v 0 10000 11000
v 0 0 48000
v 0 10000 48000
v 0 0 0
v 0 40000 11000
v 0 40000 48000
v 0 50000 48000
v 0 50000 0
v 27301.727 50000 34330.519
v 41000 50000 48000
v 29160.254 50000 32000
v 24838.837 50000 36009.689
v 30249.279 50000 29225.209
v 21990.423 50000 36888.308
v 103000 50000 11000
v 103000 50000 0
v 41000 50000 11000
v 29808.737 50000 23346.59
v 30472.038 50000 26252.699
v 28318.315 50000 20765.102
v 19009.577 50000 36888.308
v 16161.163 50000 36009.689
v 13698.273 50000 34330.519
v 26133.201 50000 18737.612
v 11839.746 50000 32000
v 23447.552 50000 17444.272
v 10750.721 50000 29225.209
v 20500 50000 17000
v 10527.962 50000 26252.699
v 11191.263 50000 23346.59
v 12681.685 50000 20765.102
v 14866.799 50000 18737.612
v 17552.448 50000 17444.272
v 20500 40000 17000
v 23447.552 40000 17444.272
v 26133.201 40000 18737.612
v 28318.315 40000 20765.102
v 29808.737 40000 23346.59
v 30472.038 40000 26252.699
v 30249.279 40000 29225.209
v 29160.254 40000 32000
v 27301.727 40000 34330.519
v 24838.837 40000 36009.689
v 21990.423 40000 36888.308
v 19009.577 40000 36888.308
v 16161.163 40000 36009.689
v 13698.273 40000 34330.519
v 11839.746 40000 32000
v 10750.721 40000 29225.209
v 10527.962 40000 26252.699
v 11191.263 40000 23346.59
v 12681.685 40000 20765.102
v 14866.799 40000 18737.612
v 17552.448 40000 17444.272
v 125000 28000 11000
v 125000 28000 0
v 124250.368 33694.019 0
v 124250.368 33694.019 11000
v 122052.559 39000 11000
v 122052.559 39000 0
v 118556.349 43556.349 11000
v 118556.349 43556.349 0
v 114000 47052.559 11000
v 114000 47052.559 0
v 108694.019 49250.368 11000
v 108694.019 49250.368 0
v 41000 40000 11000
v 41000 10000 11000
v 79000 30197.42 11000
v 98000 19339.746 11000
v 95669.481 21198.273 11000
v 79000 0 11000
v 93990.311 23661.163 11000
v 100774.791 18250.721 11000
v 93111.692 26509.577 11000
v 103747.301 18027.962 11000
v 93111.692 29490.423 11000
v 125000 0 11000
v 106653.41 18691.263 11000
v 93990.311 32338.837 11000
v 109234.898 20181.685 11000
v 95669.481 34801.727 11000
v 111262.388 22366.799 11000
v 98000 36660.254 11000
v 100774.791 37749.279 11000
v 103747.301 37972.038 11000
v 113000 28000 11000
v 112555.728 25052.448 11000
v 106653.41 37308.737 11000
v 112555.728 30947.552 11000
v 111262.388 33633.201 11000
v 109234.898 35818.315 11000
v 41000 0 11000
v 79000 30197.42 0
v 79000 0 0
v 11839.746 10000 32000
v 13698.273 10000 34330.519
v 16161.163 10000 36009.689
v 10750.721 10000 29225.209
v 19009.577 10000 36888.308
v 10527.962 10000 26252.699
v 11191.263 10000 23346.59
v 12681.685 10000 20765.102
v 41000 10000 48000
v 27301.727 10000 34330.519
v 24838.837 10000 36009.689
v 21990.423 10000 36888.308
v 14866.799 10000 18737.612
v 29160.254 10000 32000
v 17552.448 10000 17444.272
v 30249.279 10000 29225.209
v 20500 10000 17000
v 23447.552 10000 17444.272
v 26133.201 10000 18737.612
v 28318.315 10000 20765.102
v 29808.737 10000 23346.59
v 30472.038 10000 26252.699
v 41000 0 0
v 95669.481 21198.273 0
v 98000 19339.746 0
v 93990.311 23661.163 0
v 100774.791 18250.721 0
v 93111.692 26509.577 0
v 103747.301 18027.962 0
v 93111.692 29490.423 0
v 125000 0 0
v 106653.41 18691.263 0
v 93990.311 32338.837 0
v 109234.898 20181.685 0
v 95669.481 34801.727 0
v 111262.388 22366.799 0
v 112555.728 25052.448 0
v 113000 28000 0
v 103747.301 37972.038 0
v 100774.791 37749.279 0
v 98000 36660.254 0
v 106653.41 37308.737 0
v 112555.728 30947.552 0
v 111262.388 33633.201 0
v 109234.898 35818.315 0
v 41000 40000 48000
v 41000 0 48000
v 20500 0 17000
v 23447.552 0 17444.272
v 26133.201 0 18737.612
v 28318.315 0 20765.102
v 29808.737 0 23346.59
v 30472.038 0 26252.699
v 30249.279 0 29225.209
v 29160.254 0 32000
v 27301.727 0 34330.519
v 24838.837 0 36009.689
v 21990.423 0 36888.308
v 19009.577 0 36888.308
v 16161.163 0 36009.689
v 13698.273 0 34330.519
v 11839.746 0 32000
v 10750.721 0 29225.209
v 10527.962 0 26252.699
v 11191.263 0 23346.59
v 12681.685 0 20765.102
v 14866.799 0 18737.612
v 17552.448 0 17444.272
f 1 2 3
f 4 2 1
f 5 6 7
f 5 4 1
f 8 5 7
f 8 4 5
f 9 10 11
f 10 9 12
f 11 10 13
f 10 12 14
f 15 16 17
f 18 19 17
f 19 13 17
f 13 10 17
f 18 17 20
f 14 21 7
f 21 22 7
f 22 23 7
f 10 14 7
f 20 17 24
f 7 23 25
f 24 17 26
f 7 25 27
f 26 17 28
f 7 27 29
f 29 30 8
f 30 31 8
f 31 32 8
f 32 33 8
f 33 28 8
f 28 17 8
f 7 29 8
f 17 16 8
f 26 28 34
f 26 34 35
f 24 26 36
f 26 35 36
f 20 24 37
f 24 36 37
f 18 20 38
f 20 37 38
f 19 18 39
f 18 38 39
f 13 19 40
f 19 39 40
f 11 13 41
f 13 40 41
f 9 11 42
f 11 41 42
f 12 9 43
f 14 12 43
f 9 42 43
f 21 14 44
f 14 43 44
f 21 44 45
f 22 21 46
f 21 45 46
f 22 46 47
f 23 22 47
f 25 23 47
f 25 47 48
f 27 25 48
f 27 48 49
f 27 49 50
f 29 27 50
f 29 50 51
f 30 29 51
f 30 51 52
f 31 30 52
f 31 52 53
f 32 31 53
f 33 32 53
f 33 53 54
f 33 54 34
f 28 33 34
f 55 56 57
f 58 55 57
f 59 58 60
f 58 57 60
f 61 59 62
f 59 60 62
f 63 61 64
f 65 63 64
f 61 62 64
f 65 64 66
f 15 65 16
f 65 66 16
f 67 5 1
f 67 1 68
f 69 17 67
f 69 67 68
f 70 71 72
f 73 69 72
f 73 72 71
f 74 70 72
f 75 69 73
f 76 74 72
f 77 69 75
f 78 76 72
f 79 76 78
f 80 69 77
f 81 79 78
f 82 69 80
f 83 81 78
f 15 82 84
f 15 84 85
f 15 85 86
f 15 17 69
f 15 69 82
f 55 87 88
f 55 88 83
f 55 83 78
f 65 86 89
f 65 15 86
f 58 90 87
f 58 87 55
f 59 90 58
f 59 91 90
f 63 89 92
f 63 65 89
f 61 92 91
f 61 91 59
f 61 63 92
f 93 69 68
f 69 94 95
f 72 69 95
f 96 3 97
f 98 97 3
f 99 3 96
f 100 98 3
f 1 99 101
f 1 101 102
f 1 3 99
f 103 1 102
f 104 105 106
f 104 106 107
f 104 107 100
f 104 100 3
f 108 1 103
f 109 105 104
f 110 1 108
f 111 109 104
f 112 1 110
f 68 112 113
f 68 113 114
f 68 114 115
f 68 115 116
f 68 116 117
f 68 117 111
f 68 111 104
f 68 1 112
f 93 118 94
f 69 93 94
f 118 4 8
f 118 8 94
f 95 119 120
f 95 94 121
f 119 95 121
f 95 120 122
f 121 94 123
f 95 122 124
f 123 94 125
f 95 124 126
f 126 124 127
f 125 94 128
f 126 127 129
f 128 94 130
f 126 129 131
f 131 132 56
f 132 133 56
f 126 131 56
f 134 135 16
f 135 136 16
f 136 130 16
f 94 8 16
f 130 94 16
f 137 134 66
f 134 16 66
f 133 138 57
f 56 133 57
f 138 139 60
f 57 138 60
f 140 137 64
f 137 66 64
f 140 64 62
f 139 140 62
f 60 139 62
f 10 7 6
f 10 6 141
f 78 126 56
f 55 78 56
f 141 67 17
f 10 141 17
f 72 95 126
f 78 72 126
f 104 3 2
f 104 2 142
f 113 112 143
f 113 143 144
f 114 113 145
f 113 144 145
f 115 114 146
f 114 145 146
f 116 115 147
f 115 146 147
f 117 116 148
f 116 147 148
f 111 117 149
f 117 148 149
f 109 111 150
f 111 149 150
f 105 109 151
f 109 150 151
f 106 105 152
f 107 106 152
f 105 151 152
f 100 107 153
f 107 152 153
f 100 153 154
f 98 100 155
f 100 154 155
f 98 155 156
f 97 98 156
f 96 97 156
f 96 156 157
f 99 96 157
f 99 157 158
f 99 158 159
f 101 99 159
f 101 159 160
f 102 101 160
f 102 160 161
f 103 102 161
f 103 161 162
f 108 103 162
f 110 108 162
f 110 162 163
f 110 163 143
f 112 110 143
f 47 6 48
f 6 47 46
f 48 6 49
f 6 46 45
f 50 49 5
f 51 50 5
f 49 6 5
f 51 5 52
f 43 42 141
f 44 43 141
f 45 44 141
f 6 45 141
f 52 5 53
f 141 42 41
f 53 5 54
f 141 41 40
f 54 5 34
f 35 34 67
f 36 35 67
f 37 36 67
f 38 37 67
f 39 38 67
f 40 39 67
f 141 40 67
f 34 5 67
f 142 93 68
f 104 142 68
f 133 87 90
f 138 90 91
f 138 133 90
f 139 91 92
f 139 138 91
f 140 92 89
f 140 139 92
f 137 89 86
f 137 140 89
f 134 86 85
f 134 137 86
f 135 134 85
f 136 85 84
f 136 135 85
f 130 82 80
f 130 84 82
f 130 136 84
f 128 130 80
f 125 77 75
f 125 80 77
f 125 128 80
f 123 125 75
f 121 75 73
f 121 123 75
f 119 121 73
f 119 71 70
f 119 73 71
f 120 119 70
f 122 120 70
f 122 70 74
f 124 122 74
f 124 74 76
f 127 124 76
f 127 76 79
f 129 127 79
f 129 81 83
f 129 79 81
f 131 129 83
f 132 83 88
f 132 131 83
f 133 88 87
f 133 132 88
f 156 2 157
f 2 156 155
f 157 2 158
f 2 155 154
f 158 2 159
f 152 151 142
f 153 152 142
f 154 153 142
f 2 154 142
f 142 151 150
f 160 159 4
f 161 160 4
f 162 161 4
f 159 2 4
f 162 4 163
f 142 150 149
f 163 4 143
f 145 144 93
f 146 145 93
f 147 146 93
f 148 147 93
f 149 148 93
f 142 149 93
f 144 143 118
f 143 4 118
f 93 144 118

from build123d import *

# Parameters (mm, degrees)
BOSS_EXTRUDE1_DEPTH = 11000
SKETCH1_5_R         = 10000
CUT_EXTRUDE1_DEPTH  = 135078.755385556
SKETCH2_W           = 41000
SKETCH2_H           = 10000
BOSS_EXTRUDE5_DEPTH = 37000
SKETCH3_R           = 10000
CUT_EXTRUDE2_DEPTH  = 142931.052823051


with BuildPart() as part:
    # Sketch1 → Boss-Extrude1 (new body)
    with BuildSketch(Plane.XY):
        with BuildLine():
            Line((0, 0), (41000, 0))
            Line((41000, 0), (79000, 30197.419778423))
            Line((79000, 30197.419778423), (79000, 0))
            Line((79000, 0), (125000, 0))
            Line((125000, 0), (125000, 28000))
            ThreePointArc((125000, 28000), (118556.349186104, 43556.349186104), (103000, 50000))
            Line((103000, 50000), (0, 50000))
            Line((0, 50000), (0, 0))
        make_face()
    extrude(amount=BOSS_EXTRUDE1_DEPTH)

    # Sketch1<5> → Cut-Extrude1 (cut, through all)
    with BuildSketch(Plane.XY):
        with Locations((103000, 28000)):
            Circle(SKETCH1_5_R)
    extrude(amount=CUT_EXTRUDE1_DEPTH, mode=Mode.SUBTRACT)

    # Sketch2 → Boss-Extrude5 (add)
    with BuildSketch(Plane.XY.offset(11000)):
        with Locations((20500, 5000)):
            Rectangle(SKETCH2_W, SKETCH2_H)
        with Locations((20500, 45000)):
            Rectangle(SKETCH2_W, SKETCH2_H)
    extrude(amount=BOSS_EXTRUDE5_DEPTH)

    # Sketch3 → Cut-Extrude2 (cut, through all)
    with BuildSketch(Plane.XZ):
        with Locations((20500, 27000)):
            Circle(SKETCH3_R)
    extrude(amount=-CUT_EXTRUDE2_DEPTH, mode=Mode.SUBTRACT)


solid = part.part
